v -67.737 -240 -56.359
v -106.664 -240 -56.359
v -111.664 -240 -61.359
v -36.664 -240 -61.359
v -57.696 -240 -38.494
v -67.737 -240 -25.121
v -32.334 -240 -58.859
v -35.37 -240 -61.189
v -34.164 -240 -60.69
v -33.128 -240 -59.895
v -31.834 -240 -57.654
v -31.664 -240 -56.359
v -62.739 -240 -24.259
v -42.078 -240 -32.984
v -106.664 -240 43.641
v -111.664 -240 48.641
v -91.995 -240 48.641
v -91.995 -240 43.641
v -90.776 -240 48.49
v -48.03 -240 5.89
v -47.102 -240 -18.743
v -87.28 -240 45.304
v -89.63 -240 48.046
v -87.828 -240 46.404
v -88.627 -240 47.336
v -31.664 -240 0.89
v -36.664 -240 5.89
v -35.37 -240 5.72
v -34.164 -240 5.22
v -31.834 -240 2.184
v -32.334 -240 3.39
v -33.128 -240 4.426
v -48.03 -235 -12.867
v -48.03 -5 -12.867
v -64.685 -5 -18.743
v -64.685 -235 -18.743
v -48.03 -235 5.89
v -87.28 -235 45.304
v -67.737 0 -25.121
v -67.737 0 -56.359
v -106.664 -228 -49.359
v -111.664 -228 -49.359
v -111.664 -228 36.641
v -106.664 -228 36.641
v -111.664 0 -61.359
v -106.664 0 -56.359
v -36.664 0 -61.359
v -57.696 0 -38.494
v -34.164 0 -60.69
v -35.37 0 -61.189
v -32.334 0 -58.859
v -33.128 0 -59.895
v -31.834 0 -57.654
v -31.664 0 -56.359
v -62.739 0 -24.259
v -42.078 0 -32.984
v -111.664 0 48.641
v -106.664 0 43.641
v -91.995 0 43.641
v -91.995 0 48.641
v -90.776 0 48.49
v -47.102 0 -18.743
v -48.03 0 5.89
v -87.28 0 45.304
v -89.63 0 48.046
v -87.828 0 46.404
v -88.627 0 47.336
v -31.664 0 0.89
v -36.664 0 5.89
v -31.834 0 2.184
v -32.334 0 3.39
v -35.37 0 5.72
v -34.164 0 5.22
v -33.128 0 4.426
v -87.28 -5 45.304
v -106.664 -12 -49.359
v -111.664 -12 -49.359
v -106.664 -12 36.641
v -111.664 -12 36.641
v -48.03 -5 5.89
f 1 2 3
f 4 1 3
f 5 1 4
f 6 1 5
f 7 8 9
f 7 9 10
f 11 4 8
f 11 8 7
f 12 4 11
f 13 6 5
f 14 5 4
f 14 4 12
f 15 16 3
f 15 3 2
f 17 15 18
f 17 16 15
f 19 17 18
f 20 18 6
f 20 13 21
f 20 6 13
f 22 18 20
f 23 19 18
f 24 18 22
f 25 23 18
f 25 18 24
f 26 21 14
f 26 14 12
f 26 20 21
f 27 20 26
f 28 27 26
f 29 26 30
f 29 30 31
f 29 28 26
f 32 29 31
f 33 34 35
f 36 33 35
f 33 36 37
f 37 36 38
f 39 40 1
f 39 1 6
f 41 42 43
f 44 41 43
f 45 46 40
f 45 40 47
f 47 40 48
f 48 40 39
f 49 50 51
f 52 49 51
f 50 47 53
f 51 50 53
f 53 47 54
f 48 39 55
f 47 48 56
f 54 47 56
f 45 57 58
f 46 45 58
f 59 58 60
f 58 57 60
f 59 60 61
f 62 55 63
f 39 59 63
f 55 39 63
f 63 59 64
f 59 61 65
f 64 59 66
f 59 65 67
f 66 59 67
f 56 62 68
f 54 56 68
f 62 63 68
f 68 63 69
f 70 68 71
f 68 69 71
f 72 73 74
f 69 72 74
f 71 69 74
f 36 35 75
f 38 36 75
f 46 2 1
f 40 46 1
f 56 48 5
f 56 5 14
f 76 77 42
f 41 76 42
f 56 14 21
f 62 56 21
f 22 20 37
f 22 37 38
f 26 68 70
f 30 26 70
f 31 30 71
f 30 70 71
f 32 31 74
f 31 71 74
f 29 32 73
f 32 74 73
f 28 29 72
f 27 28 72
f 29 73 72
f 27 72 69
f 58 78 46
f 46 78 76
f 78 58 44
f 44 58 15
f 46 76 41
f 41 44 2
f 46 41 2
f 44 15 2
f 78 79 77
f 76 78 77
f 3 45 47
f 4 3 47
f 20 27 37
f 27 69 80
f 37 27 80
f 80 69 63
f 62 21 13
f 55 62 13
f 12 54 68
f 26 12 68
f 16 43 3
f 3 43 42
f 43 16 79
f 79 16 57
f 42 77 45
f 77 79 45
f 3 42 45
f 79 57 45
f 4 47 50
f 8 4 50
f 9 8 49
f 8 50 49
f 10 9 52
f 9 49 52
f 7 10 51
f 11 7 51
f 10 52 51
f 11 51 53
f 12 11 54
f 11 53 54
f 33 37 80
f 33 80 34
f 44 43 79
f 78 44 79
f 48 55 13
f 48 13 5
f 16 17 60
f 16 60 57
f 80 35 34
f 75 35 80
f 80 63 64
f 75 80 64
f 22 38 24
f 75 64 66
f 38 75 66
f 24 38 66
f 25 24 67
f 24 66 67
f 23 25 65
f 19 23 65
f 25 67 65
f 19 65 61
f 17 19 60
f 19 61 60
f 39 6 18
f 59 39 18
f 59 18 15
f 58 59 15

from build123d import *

# Parameters (mm, degrees)
F1_DEPTH  = 240
F2_DEPTH  = 5
F5_DEPTH  = 260
F6_DEPTH  = 252
F8_DEPTH  = 5
F10_DEPTH = 5


with BuildPart() as f1:
    # F0 (on Front) → F1 (new body)
    with BuildSketch(Plane.XZ):
        with BuildLine():
            Line((-91.99476, 48.640542), (-111.663712, 48.640542))
            Line((-111.663712, 48.640542), (-111.663712, -61.359458))
            Line((-111.663712, -61.359458), (-36.663712, -61.359458))
            ThreePointArc((-36.663712, -61.359458), (-33.128178, -59.894992), (-31.663712, -56.359458))
            Line((-31.663712, -56.359458), (-31.663712, 0.890209))
            ThreePointArc((-31.663712, 0.890209), (-33.128178, 4.425743), (-36.663712, 5.890209))
            Line((-36.663712, 5.890209), (-48.030325, 5.890209))
            Line((-48.030325, 5.890209), (-48.030325, -12.867237))
            Line((-48.030325, -12.867237), (-64.685345, -18.742749))
            Line((-64.685345, -18.742749), (-87.279566, 45.303955))
            ThreePointArc((-87.279566, 45.303955), (-89.106601, 47.722028), (-91.99476, 48.640542))
        make_face()
    extrude(amount=F1_DEPTH)

    # F0 (on Front) → F2 (join)
    with BuildSketch(Plane.XZ):
        Polygon((-48.030325, 5.890209), (-87.279566, 45.303955), (-64.685345, -18.742749), (-48.030325, -12.867237), align=None)
    extrude(amount=F2_DEPTH)

    # F4 (on face) → F5 (cut)
    with BuildSketch(Plane.XZ.offset(240)):
        Polygon((-91.99476, 43.640542), (-106.663712, 43.640542), (-106.663712, -56.359458), (-67.737126, -56.359458), (-67.737126, -25.121357), align=None)
    extrude(amount=-F5_DEPTH, mode=Mode.SUBTRACT)

    # F3 (on face) → F6 (cut)
    with BuildSketch(Plane.XZ.offset(240)):
        Polygon((-47.102027, -18.742749), (-62.739263, -24.259211), (-57.695907, -38.493532), (-42.078068, -32.983914), align=None)
    extrude(amount=-F6_DEPTH, mode=Mode.SUBTRACT)

    # F7 (on face) → F8 (join)
    with BuildSketch(Plane.XZ.offset(240)):
        Polygon((-48.030325, -12.867237), (-48.030325, 5.890209), (-87.279566, 45.303955), (-64.685345, -18.742749), align=None)
    extrude(amount=-F8_DEPTH)

    # F9 (on face) → F10 (cut)
    with BuildSketch(Plane(origin=(-111.663712, 0, 0), x_dir=(0, -1, 0), z_dir=(-1, 0, 0))):
        Polygon((227.999998, -49.359457), (227.999998, 36.64054), (12.000002, 36.64054), (12.000002, 5.890209), (12.000002, 0.890209), (12.000002, -49.359457), align=None)
    extrude(amount=-F10_DEPTH, mode=Mode.SUBTRACT)


solid = f1.part
